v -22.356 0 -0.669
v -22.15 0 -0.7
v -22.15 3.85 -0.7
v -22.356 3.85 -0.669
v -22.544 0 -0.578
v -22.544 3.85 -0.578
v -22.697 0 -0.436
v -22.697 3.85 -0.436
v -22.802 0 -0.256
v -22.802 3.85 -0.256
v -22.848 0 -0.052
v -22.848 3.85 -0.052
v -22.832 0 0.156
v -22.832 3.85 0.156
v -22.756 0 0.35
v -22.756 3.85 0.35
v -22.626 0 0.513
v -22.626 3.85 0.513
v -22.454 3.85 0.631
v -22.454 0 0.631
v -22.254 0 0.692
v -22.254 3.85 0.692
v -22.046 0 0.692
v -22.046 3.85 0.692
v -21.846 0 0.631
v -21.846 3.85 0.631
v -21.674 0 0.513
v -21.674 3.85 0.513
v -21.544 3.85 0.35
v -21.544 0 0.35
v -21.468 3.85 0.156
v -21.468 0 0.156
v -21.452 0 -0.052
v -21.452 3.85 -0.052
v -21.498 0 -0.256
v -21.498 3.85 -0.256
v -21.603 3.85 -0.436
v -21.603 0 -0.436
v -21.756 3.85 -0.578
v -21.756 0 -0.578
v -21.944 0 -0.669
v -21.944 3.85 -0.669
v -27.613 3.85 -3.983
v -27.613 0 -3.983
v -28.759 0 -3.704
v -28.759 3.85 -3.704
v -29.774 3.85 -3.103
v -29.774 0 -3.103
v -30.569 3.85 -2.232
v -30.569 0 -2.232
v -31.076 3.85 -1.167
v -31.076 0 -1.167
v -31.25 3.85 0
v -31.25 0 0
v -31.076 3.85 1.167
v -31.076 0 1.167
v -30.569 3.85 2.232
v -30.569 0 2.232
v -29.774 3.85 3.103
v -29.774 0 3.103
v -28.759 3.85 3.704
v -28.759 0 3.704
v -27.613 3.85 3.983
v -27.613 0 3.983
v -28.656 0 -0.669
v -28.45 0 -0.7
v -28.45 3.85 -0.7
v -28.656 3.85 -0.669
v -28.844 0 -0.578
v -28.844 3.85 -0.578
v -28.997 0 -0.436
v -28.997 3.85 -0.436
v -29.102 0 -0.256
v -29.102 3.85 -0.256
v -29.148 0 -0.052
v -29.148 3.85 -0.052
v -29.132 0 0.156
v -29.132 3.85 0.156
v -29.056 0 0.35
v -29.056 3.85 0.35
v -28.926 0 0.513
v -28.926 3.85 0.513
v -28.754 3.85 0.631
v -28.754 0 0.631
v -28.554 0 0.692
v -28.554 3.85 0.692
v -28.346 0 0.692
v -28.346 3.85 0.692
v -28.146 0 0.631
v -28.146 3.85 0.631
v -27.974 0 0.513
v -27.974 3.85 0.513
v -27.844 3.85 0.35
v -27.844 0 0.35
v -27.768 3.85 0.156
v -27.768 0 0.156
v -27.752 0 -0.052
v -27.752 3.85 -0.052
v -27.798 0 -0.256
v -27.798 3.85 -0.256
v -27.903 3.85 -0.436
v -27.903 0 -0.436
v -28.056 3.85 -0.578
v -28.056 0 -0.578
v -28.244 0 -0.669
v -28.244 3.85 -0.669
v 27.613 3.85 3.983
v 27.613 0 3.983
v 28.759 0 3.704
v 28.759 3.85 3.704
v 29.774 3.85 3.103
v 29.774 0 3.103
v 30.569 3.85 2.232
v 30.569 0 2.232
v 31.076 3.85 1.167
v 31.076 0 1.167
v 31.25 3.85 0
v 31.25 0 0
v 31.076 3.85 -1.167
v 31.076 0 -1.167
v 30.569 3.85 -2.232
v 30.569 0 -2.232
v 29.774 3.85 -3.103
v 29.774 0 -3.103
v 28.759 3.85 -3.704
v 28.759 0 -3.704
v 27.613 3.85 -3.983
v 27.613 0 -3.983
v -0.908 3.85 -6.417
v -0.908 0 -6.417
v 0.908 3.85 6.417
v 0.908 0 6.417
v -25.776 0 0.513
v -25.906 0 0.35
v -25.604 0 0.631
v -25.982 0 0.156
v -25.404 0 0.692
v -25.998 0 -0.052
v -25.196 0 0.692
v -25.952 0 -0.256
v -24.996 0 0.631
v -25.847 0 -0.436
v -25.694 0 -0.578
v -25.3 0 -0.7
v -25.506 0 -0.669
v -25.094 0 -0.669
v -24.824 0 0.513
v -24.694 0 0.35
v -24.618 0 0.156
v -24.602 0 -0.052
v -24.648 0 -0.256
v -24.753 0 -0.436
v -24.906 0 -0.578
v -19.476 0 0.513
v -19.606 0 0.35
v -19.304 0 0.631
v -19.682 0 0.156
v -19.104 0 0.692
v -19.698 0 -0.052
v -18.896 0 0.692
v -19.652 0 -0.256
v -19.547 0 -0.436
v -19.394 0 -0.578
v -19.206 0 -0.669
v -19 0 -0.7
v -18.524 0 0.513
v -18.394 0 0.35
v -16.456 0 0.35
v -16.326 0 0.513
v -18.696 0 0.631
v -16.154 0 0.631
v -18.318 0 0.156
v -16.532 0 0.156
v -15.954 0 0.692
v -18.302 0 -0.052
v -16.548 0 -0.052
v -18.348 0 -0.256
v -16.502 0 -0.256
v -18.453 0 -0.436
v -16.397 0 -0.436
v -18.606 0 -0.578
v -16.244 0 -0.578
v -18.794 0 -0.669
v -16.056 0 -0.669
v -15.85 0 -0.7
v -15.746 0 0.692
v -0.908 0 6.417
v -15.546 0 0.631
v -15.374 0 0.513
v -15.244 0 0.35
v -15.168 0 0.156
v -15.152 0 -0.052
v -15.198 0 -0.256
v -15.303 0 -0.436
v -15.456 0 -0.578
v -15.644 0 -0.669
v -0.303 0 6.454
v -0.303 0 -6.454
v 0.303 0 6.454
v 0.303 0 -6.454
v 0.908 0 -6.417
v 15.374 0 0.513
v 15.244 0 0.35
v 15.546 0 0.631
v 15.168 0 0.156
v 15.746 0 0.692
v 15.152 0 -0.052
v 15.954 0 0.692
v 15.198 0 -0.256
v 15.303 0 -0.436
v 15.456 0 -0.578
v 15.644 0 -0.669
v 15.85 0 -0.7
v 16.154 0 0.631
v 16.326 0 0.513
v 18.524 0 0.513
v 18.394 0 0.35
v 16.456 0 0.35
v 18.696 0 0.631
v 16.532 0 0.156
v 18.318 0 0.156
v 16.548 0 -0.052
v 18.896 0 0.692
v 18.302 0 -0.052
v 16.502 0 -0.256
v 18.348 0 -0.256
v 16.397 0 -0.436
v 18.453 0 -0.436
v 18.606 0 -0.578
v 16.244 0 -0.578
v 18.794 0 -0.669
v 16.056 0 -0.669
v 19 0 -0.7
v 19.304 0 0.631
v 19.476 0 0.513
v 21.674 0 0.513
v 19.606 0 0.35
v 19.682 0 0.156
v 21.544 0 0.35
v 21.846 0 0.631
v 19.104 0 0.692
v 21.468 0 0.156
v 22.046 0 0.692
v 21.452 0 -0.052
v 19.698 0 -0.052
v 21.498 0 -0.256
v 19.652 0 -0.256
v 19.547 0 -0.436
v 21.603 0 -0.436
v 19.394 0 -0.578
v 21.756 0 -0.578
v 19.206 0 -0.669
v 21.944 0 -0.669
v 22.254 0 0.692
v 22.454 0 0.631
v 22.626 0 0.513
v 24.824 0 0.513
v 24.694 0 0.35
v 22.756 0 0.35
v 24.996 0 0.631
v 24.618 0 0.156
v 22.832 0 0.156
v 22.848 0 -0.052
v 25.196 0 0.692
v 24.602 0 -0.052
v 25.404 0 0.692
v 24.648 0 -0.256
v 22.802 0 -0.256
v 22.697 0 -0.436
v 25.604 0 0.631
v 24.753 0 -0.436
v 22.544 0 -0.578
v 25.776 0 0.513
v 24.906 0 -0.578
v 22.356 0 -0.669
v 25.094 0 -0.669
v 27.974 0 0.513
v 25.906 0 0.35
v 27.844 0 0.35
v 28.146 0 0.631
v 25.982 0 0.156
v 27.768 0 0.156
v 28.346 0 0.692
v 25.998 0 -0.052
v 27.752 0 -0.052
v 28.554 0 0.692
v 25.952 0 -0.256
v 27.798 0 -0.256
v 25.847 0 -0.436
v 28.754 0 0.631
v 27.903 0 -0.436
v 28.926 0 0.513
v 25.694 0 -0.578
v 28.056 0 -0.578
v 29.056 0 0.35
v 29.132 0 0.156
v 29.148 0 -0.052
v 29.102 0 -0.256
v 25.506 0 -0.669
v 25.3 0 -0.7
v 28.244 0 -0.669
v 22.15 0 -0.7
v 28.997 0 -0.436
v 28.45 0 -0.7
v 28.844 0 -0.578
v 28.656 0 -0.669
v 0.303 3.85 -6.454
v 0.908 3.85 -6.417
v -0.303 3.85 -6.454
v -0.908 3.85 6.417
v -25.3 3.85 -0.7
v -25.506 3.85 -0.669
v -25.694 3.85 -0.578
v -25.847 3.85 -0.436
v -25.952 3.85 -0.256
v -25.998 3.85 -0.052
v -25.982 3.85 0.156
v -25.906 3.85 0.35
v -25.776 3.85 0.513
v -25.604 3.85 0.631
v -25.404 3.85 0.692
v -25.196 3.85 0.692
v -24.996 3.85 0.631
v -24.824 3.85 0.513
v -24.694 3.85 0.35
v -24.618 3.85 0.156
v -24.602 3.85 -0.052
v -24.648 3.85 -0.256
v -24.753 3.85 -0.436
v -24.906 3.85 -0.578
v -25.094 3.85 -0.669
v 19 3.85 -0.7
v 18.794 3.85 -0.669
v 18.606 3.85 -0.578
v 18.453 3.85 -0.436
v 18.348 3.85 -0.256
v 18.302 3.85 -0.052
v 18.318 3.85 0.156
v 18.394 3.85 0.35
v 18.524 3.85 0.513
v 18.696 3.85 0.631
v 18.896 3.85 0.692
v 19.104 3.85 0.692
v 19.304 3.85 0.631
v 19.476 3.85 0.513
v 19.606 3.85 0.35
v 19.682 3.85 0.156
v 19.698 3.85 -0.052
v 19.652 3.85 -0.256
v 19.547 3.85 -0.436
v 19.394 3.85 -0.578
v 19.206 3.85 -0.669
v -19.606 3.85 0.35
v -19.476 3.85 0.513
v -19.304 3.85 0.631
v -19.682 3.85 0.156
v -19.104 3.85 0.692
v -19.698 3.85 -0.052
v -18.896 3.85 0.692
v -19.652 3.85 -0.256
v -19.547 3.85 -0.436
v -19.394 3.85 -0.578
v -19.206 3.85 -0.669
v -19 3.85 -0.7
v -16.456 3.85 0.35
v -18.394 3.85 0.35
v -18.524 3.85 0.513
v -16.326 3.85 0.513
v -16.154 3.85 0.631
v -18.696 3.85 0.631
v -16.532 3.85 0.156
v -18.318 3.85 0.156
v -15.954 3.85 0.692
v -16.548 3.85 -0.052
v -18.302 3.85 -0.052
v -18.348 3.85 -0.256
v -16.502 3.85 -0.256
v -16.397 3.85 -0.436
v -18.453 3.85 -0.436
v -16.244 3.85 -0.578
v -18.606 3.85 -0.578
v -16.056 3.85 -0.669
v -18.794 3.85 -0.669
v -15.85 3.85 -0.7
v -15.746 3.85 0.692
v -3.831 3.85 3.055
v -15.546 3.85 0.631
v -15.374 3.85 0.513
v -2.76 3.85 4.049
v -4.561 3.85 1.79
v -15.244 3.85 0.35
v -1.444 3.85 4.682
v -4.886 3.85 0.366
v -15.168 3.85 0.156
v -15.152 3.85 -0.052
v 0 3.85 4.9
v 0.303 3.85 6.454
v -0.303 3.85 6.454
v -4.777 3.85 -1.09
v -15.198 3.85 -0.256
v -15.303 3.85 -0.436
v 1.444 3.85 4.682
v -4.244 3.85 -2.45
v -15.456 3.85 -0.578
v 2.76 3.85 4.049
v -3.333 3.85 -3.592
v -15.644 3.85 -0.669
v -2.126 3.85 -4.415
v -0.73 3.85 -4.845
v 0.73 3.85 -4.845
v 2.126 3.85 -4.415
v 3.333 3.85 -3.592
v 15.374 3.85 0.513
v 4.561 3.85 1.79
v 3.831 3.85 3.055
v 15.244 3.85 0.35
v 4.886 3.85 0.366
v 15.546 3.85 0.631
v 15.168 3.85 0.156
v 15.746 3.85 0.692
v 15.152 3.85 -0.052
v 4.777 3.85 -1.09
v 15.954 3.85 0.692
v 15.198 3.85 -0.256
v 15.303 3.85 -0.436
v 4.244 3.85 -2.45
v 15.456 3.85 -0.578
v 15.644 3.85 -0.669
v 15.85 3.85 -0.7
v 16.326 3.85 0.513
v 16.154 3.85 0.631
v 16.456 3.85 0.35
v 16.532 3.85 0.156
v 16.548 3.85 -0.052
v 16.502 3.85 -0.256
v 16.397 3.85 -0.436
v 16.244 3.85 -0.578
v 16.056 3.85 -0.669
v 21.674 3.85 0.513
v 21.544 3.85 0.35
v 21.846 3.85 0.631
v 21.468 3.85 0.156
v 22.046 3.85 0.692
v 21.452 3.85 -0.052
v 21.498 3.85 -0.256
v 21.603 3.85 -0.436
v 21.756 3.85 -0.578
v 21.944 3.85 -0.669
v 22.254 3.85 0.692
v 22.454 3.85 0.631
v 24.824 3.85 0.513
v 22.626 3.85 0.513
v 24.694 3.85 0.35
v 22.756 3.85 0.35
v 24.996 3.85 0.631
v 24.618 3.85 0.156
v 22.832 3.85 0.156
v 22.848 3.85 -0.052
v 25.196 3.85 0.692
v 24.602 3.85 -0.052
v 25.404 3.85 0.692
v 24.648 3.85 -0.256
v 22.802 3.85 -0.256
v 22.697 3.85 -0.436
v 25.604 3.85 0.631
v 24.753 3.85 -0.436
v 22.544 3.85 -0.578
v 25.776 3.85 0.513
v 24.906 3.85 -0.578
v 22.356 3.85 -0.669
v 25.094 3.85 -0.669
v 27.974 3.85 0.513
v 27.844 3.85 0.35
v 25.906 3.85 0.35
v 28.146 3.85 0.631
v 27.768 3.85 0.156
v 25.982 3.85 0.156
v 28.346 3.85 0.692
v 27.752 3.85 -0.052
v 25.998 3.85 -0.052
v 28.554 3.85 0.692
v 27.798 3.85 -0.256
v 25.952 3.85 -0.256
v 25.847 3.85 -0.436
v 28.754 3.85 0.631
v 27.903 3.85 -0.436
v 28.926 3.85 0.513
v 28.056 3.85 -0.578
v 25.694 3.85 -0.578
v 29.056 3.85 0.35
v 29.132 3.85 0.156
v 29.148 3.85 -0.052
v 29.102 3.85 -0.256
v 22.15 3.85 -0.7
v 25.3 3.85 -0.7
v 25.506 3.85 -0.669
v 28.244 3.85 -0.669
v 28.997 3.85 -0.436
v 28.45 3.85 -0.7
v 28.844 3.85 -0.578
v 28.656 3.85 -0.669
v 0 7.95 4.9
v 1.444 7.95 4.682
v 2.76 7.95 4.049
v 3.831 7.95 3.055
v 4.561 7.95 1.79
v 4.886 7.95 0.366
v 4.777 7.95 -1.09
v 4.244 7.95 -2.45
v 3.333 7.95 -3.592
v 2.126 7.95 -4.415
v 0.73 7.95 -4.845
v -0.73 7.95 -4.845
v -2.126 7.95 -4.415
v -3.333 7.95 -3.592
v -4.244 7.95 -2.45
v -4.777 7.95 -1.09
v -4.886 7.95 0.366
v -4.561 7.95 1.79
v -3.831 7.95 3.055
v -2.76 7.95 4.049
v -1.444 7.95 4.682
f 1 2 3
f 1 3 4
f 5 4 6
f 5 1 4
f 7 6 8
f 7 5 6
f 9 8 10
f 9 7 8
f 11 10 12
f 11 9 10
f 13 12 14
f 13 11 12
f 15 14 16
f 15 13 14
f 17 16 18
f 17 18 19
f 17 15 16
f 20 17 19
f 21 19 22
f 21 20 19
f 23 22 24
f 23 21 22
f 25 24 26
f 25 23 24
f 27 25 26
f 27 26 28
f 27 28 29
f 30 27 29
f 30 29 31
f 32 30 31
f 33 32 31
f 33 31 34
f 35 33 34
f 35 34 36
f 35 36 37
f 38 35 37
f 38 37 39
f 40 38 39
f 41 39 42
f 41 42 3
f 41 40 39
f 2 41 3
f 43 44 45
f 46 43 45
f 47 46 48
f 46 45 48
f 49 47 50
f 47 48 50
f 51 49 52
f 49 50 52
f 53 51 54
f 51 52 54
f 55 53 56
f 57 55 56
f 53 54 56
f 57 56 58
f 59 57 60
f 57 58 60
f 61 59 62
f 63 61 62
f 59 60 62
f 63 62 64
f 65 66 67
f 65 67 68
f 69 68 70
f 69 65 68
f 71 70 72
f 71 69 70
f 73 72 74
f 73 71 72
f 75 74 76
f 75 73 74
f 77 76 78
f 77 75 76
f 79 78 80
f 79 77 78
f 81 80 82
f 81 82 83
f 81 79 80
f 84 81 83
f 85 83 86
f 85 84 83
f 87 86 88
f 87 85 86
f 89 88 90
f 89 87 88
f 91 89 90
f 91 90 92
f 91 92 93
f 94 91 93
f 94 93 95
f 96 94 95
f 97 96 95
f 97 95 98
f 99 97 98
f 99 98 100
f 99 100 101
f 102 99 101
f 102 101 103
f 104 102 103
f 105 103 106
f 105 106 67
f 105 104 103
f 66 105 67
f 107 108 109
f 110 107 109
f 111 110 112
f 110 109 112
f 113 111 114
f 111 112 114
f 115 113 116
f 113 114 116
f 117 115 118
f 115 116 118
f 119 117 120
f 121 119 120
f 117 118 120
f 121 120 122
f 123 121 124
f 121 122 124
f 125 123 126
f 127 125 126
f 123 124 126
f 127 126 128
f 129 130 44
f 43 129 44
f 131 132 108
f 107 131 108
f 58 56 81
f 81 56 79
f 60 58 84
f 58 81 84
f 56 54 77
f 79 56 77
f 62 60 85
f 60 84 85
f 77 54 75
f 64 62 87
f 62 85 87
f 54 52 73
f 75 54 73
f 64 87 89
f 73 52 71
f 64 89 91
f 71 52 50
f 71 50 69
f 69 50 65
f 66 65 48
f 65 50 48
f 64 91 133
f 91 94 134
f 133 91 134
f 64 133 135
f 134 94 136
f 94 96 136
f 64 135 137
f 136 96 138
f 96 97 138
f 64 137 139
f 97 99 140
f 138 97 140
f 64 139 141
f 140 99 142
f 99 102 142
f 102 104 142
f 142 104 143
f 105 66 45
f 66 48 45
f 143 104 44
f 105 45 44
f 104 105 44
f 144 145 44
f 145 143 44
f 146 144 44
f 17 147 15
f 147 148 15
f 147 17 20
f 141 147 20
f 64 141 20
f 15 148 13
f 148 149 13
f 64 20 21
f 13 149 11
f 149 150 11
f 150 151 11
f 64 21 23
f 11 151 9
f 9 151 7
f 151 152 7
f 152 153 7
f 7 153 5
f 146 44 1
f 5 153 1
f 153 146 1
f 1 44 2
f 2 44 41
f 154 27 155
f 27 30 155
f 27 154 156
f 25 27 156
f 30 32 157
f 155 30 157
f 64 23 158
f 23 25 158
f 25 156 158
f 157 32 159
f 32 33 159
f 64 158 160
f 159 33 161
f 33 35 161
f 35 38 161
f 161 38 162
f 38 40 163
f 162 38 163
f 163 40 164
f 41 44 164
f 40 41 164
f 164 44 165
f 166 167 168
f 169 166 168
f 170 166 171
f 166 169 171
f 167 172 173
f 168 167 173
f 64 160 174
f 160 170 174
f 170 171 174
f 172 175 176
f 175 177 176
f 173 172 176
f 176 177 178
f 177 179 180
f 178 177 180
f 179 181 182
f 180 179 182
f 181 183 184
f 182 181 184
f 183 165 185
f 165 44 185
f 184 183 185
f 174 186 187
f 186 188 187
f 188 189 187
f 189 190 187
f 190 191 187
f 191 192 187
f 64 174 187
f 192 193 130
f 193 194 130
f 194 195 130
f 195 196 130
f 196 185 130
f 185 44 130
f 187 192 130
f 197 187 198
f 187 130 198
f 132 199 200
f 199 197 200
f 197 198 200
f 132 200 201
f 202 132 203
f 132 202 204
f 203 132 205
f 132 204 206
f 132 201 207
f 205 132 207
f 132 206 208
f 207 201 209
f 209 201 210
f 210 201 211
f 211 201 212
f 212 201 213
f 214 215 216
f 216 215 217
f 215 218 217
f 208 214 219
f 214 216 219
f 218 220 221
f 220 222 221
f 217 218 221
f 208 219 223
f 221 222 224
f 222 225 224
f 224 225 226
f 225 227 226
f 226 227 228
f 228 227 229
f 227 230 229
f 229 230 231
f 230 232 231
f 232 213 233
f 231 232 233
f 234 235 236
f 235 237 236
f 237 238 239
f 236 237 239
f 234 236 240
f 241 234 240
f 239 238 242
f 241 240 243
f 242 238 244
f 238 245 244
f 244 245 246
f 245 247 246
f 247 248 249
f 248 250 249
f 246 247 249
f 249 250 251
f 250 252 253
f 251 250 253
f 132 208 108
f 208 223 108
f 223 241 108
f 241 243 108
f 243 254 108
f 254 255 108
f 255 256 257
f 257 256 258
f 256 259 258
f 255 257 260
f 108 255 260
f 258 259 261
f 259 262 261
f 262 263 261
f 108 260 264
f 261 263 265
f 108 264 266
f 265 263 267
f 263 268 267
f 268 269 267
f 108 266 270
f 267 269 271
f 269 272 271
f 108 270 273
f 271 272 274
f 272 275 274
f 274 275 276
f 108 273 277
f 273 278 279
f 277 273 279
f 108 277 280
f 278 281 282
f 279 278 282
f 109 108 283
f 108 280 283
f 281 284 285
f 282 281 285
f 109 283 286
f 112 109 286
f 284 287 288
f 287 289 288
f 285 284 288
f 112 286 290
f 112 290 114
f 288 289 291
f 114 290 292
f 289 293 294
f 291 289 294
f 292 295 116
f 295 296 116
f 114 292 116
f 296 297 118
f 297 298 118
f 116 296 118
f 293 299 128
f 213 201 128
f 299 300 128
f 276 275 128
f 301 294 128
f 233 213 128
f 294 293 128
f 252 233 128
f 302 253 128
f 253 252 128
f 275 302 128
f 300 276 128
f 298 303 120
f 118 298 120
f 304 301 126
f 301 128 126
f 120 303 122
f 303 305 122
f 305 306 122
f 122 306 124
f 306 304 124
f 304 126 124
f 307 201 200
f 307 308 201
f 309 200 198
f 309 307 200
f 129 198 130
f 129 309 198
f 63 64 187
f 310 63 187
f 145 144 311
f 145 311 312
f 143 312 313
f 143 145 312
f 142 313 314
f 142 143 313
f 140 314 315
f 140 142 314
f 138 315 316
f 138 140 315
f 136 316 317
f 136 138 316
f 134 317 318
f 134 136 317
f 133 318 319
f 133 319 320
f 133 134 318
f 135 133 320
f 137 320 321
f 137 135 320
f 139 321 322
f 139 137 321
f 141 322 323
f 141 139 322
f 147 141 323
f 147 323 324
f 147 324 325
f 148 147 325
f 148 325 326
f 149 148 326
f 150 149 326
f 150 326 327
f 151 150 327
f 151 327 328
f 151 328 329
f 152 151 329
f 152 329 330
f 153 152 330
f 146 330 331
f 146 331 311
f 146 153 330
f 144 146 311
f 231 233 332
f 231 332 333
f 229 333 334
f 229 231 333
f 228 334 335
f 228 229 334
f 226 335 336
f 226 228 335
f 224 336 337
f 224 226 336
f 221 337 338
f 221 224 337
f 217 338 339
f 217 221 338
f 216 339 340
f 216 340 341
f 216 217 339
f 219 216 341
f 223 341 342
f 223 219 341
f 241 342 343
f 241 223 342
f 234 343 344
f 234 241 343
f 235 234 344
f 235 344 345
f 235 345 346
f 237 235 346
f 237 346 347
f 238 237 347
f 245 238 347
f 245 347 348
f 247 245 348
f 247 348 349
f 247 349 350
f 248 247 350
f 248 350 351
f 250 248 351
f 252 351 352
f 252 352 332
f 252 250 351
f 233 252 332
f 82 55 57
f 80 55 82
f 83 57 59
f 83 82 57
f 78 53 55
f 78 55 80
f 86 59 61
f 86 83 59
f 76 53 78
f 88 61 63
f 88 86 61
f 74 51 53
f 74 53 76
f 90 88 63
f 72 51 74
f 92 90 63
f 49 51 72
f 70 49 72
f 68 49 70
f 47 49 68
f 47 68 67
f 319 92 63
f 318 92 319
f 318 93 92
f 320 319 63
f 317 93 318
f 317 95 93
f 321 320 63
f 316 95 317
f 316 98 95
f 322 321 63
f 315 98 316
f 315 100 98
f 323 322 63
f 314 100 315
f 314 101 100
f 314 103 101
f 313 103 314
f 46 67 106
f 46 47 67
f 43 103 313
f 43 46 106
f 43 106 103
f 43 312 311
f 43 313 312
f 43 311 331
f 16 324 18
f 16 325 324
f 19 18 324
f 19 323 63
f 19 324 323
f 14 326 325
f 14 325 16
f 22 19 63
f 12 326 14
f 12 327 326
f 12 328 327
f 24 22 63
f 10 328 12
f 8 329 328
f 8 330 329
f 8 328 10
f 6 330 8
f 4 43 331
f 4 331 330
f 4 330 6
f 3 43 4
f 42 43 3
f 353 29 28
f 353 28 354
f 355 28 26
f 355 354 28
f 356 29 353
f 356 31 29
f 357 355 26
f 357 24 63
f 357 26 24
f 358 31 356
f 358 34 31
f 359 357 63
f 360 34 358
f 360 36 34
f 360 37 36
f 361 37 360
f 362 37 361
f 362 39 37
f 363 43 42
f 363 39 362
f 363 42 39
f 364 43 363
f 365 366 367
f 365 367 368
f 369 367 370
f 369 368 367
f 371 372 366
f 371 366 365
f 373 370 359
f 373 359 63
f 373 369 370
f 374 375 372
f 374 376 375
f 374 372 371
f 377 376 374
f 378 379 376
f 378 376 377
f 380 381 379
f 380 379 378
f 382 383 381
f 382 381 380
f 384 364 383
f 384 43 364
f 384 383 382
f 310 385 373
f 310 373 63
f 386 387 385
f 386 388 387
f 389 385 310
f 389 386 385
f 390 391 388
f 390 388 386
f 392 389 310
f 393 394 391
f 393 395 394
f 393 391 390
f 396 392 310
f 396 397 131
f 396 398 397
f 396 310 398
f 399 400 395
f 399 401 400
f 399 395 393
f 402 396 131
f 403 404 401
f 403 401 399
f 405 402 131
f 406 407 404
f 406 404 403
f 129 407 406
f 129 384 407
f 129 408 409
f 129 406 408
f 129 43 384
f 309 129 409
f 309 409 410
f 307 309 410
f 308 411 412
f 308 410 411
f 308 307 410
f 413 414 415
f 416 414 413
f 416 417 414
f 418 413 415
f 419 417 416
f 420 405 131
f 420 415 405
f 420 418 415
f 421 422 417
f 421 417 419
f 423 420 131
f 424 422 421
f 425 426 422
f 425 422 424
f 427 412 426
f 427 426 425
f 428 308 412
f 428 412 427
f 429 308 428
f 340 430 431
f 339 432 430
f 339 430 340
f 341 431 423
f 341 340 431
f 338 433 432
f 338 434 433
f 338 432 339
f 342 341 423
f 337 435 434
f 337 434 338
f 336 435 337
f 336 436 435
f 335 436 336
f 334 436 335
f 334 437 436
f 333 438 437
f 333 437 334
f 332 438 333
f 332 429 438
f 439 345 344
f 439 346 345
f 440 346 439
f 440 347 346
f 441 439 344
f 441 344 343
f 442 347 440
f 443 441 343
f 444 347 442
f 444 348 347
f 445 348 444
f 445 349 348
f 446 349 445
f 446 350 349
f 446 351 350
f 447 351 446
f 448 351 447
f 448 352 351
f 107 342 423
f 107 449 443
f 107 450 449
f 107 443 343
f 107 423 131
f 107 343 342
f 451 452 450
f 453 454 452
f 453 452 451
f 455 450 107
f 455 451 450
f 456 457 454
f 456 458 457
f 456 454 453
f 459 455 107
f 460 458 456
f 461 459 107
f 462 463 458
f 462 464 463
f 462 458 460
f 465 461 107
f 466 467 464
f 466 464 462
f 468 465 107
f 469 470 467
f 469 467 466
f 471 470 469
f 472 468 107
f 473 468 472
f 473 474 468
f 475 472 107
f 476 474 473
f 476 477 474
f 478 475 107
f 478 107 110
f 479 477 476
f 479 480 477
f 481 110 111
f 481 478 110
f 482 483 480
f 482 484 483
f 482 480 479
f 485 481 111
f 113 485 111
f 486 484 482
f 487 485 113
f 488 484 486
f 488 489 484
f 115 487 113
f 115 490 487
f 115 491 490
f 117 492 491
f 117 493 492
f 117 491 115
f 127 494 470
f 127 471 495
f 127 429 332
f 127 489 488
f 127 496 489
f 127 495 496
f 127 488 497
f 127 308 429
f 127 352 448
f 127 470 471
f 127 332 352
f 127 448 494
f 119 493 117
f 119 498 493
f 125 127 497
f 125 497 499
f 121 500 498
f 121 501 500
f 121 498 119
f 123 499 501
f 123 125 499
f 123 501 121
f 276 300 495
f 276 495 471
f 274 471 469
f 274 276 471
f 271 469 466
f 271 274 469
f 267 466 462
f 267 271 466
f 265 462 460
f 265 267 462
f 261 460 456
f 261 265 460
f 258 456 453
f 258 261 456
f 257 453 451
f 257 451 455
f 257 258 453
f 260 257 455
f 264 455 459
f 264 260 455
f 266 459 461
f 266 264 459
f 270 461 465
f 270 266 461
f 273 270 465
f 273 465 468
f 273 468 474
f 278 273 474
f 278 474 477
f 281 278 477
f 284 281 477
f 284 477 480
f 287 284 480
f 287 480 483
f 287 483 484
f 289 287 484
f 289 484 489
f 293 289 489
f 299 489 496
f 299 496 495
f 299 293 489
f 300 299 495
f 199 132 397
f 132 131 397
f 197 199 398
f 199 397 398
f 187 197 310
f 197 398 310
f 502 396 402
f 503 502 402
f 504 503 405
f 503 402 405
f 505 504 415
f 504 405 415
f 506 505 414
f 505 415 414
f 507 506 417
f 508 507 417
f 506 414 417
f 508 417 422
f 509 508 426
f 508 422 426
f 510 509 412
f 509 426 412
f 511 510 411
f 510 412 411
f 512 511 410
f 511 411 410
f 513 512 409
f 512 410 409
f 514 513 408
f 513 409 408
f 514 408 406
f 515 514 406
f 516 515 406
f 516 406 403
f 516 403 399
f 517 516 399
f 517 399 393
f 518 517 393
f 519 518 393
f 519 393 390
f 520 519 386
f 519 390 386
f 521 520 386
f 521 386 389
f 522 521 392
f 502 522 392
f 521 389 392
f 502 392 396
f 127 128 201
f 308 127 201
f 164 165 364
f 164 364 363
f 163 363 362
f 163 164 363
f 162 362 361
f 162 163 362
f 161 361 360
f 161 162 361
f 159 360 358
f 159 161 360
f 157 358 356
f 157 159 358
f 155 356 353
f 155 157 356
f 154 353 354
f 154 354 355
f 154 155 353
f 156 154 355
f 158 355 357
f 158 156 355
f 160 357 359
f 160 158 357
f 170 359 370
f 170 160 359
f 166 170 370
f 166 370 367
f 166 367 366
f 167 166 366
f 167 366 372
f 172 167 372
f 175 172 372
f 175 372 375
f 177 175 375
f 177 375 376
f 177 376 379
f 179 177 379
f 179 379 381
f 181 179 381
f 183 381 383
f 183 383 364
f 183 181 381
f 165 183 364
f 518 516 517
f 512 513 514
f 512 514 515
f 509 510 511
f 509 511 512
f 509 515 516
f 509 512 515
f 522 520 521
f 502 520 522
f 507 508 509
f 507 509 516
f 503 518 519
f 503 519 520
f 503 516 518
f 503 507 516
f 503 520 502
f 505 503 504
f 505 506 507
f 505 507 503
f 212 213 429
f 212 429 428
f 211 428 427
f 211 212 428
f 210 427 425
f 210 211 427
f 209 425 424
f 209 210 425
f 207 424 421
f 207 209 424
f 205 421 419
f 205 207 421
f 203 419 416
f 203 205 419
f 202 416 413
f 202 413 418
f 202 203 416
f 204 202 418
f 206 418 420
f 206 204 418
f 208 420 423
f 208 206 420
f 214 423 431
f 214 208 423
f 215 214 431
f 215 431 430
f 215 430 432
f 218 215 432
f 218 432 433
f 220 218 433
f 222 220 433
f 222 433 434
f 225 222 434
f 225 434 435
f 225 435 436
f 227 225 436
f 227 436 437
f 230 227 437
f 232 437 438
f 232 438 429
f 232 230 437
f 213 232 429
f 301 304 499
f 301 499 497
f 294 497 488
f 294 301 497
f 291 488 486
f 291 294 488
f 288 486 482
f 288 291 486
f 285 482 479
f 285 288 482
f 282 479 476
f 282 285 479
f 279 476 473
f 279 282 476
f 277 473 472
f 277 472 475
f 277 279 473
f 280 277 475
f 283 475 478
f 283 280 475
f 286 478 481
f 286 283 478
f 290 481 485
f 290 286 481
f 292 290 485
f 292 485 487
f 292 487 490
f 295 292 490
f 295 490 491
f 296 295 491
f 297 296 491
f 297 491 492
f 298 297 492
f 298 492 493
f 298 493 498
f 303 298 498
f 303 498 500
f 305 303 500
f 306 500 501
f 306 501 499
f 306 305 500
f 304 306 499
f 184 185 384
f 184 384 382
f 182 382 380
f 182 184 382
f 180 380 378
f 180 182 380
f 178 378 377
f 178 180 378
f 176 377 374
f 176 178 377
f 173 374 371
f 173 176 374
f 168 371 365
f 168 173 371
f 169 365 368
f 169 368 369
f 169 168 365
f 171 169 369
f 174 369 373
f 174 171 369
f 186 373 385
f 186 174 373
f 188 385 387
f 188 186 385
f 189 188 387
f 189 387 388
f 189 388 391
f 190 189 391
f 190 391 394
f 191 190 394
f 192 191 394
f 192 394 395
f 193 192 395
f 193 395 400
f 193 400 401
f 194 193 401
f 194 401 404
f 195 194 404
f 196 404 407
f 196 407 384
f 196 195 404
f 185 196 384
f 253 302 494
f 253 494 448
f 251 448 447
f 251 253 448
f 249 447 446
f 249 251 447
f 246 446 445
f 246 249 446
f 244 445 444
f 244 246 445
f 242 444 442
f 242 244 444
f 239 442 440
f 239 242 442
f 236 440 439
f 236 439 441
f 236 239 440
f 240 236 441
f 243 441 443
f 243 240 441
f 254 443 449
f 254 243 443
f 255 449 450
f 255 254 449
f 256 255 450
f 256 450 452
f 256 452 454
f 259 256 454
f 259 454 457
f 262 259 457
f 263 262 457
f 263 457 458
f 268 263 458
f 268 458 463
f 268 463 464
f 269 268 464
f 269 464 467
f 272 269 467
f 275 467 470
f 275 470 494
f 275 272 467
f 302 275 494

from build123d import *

# Parameters (mm, degrees)
SKETCH1_R           = 0.7
BOSS_EXTRUDE1_DEPTH = 3.85
FILLET1_R           = 10
SKETCH2_R           = 4.9
BOSS_EXTRUDE2_DEPTH = 4.1


with BuildPart() as part:
    # Sketch1 → Boss-Extrude1 (new body)
    with BuildSketch(Plane(origin=(0, 0, 0), x_dir=(1, 0, 0), z_dir=(0, 1, 0))):
        with BuildLine():
            Line((27.613034708, 3.983491659), (0, 6.5))
            Line((0, 6.5), (-27.613034708, 3.983491659))
            ThreePointArc((-27.613034708, 3.983491659), (-31.25, 0), (-27.613034708, -3.983491659))
            Line((-27.613034708, -3.983491659), (0, -6.5))
            Line((0, -6.5), (27.613034708, -3.983491659))
            ThreePointArc((27.613034708, -3.983491659), (31.25, 0), (27.613034708, 3.983491659))
        make_face()
        with Locations(Location((28.45, 0, 0), (0, 0, 90))):
            Circle(SKETCH1_R, mode=Mode.SUBTRACT)
        with Locations(Location((25.3, 0, 0), (0, 0, 90))):
            Circle(SKETCH1_R, mode=Mode.SUBTRACT)
        with Locations(Location((22.15, 0, 0), (0, 0, 90))):
            Circle(SKETCH1_R, mode=Mode.SUBTRACT)
        with Locations(Location((19, 0, 0), (0, 0, 90))):
            Circle(SKETCH1_R, mode=Mode.SUBTRACT)
        with Locations(Location((15.85, 0, 0), (0, 0, 90))):
            Circle(SKETCH1_R, mode=Mode.SUBTRACT)
        with Locations(Location((-15.85, 0, 0), (0, 0, 90))):
            Circle(SKETCH1_R, mode=Mode.SUBTRACT)
        with Locations(Location((-19, 0, 0), (0, 0, 90))):
            Circle(SKETCH1_R, mode=Mode.SUBTRACT)
        with Locations(Location((-22.15, 0, 0), (0, 0, 90))):
            Circle(SKETCH1_R, mode=Mode.SUBTRACT)
        with Locations(Location((-25.3, 0, 0), (0, 0, 90))):
            Circle(SKETCH1_R, mode=Mode.SUBTRACT)
        with Locations(Location((-28.45, 0, 0), (0, 0, 90))):
            Circle(SKETCH1_R, mode=Mode.SUBTRACT)
    extrude(amount=BOSS_EXTRUDE1_DEPTH)

    # Fillet1
    fillet1_edges = [part.edges().sort_by_distance(p)[0] for p in [
        (0, 1.925, 6.5),
        (0, 1.925, -6.5),
    ]]
    fillet(fillet1_edges, radius=FILLET1_R)

    # Sketch2 → Boss-Extrude2 (add)
    with BuildSketch(Plane(origin=(0, 3.85, 0), x_dir=(1, 0, 0), z_dir=(0, 1, 0))):
        with Locations(Location((0, 0, 0), (0, 0, 270))):
            Circle(SKETCH2_R)
    extrude(amount=BOSS_EXTRUDE2_DEPTH)


solid = part.part
